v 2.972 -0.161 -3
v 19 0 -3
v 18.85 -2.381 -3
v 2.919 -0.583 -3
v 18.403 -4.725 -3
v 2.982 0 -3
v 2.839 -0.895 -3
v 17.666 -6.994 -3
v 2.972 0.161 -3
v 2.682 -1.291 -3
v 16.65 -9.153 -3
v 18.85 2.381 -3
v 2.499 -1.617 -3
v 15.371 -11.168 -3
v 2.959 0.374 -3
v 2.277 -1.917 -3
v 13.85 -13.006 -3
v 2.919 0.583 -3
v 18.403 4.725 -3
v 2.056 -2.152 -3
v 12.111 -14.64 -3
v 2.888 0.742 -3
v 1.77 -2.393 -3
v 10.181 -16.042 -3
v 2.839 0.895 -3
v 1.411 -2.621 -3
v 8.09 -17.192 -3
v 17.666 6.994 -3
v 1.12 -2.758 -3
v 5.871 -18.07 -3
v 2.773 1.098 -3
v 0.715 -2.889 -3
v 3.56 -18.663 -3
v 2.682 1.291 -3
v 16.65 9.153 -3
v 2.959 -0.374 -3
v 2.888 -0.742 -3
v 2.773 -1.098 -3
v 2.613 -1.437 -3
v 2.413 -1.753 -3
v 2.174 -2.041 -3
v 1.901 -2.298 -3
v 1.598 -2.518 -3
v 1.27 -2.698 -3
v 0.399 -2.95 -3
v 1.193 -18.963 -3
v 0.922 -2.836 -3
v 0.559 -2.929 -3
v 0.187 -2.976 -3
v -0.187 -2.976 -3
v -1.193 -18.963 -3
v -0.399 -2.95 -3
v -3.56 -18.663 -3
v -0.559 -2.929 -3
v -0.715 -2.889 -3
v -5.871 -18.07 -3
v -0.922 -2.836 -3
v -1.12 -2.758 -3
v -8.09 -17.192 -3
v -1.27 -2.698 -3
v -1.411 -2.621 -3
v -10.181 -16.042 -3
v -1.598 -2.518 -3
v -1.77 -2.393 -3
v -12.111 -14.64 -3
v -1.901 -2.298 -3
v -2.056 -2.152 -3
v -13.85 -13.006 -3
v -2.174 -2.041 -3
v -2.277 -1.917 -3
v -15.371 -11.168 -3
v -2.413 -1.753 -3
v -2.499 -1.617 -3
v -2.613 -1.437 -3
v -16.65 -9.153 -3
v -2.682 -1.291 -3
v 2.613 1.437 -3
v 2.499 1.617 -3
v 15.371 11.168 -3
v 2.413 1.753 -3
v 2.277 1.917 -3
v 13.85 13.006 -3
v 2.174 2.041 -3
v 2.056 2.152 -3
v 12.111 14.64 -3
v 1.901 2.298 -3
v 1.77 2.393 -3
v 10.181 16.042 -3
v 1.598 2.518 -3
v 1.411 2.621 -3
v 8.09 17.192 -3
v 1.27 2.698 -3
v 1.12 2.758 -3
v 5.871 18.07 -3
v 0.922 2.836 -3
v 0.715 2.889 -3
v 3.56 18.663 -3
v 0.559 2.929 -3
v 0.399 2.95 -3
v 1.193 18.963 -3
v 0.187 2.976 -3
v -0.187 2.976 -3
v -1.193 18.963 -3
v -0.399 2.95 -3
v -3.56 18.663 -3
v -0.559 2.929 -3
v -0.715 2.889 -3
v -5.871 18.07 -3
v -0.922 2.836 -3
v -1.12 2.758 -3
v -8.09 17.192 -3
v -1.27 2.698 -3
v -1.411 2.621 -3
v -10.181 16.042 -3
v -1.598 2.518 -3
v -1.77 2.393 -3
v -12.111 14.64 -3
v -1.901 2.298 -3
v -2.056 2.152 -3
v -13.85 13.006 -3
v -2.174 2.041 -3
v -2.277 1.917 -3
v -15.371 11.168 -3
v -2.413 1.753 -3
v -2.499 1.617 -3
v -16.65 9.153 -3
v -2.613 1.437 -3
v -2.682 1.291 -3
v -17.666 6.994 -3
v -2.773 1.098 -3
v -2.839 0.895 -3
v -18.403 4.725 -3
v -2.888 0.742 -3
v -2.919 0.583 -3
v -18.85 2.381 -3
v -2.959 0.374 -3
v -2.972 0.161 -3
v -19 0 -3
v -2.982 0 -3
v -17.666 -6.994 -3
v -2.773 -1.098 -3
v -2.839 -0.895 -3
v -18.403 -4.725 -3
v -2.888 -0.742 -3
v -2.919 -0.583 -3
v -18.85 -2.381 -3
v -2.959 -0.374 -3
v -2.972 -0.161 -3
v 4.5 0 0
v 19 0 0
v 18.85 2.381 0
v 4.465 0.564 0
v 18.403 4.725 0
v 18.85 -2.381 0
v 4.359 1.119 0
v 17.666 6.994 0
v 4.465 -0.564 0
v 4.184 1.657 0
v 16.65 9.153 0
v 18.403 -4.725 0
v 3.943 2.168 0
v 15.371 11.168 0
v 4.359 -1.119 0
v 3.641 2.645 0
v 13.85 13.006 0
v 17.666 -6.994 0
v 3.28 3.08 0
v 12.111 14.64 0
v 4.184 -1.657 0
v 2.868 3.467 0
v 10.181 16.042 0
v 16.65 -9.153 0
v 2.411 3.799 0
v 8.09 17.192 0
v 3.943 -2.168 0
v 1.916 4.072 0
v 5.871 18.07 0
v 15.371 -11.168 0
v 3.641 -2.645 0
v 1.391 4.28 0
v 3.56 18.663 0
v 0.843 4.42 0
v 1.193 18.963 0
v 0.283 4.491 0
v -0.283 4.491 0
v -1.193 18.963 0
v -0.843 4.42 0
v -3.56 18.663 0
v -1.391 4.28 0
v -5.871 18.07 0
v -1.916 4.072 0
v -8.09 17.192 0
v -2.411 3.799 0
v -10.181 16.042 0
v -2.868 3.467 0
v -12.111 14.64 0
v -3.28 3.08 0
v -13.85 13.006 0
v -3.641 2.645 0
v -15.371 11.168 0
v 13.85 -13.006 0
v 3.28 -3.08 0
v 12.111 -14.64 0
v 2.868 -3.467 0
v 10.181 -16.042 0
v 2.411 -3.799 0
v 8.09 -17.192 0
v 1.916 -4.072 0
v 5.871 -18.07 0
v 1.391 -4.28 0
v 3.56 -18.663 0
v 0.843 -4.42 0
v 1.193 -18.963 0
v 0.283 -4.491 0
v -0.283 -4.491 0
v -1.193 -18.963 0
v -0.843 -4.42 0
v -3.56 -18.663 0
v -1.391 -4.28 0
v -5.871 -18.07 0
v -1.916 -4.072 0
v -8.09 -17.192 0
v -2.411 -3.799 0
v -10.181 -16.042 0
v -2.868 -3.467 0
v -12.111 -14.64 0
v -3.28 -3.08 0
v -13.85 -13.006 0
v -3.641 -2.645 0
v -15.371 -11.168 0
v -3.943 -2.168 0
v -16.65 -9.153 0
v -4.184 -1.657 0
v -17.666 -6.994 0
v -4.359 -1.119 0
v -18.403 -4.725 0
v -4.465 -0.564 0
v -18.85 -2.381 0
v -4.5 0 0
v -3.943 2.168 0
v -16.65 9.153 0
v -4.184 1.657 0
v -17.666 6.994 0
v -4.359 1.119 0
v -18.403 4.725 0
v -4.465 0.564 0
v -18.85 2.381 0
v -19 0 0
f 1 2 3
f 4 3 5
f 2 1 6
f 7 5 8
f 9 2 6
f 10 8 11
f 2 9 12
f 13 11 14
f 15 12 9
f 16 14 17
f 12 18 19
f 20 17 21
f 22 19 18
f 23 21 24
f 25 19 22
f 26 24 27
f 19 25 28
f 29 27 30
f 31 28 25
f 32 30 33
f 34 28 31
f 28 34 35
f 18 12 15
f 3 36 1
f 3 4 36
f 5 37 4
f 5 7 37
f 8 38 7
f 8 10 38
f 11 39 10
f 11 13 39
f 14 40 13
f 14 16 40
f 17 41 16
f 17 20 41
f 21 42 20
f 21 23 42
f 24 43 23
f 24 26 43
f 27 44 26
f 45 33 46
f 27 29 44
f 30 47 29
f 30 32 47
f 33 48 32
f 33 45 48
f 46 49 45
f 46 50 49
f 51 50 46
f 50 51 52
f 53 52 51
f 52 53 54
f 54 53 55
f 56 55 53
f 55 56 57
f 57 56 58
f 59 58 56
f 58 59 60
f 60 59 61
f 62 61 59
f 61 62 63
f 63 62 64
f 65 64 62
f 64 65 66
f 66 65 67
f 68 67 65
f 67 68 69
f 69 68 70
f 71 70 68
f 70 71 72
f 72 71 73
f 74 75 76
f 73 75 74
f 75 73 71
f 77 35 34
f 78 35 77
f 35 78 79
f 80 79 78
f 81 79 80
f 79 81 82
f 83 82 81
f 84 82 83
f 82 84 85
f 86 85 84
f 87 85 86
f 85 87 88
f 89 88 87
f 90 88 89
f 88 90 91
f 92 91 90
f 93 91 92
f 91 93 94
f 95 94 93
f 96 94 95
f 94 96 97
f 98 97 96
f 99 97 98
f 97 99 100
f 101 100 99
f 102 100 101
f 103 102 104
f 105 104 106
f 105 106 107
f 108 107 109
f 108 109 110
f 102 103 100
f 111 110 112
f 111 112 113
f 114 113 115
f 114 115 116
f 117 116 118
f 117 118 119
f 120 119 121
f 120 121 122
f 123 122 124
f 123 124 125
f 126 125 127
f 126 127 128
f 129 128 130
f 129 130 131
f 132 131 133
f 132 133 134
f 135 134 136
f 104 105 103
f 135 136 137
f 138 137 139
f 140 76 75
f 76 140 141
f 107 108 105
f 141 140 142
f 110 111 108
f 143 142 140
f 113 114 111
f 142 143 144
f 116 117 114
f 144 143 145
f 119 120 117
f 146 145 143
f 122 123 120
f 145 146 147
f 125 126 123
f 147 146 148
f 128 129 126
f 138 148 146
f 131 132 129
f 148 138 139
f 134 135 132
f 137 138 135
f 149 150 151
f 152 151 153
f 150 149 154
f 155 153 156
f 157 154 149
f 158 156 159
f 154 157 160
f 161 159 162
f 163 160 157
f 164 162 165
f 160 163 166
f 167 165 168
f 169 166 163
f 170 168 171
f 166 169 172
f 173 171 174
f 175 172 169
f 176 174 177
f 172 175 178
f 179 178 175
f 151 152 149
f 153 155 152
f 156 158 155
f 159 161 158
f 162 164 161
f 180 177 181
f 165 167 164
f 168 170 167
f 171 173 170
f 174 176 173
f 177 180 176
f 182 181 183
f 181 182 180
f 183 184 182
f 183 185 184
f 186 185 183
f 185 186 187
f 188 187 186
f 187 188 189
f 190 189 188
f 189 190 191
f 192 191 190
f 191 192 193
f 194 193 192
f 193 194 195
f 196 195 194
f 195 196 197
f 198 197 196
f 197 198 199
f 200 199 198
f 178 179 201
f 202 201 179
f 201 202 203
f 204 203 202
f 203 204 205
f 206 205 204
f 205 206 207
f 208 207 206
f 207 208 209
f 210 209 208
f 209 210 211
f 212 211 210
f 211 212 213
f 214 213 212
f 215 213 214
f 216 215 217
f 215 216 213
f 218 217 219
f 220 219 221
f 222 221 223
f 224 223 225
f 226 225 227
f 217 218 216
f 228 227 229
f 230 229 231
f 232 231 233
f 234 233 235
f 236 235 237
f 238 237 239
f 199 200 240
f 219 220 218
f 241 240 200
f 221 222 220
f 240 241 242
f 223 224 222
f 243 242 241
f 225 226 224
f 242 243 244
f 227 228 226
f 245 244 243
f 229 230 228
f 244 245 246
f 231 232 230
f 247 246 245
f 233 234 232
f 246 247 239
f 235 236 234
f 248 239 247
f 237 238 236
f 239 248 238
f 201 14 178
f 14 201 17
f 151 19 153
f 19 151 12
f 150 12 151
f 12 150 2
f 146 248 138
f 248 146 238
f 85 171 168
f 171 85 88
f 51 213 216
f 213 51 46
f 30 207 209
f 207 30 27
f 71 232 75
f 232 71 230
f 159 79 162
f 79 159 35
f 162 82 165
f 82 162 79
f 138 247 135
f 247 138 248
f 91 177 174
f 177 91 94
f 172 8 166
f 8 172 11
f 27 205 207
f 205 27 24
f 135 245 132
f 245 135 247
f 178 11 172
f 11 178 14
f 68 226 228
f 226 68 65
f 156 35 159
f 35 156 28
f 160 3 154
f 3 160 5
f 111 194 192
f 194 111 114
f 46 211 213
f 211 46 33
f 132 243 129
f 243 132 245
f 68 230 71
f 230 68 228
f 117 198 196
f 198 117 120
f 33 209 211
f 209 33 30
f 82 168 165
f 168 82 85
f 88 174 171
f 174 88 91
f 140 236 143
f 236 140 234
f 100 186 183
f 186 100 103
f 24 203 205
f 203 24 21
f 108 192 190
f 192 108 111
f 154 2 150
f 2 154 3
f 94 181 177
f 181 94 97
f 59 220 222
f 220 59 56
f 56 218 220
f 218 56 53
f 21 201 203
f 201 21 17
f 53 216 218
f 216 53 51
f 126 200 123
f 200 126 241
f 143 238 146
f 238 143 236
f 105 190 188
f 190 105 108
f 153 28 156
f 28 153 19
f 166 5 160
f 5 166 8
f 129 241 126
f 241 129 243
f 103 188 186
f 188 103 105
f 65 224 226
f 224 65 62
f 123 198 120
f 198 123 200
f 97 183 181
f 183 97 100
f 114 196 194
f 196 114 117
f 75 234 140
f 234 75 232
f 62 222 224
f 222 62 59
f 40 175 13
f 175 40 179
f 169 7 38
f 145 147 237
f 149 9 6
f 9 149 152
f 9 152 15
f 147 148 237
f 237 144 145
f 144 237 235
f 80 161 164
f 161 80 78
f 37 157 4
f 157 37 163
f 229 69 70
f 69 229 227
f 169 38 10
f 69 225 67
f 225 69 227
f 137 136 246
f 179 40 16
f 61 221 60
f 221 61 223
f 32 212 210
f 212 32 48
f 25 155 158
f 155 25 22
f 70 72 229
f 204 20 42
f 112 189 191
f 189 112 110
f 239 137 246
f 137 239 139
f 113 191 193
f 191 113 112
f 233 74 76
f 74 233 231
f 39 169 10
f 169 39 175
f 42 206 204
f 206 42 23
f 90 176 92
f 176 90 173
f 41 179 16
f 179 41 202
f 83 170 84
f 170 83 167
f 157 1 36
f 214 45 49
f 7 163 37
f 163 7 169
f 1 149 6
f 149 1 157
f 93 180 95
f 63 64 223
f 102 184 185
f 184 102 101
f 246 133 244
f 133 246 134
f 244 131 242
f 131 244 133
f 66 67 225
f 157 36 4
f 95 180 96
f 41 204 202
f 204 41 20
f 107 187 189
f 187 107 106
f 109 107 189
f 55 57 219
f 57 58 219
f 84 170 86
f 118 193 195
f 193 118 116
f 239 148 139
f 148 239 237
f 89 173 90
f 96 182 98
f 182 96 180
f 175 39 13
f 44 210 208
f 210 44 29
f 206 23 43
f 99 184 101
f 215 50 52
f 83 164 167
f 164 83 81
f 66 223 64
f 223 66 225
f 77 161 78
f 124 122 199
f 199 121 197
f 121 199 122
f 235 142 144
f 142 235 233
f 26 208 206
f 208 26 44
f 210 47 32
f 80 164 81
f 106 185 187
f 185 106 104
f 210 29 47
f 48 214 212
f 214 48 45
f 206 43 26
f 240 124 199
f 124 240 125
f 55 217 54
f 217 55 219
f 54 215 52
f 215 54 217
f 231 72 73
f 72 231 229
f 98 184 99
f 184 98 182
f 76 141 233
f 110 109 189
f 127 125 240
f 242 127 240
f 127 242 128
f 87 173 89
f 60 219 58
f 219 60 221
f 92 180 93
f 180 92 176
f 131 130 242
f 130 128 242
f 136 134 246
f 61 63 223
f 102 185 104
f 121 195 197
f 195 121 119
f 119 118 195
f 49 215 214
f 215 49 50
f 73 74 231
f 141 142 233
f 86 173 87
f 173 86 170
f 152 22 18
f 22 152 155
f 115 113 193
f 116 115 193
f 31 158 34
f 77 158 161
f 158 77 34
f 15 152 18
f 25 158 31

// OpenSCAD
$fn = 50;


difference() {
	union() {
		translate(v = [0, 0, -3.0000000000]) {
			cylinder(h = 3, r = 10.0000000000);
		}
		translate(v = [0, 0, -3.0000000000]) {
			cylinder(h = 3, r = 19.0000000000);
		}
	}
	union() {
		translate(v = [0, 0, 0]) {
			rotate(a = [0, 0, 0]) {
				difference() {
					union() {
						#translate(v = [0, 0, -3.0000000000]) {
							cylinder(h = 3, r = 2.2500000000);
						}
						#translate(v = [0, 0, -4.2000000000]) {
							cylinder(h = 4.2000000000, r1 = 2.3750000000, r2 = 4.5000000000);
						}
						#translate(v = [0, 0, -3.0000000000]) {
							cylinder(h = 3, r = 2.3750000000);
						}
						#translate(v = [0, 0, -3.0000000000]) {
							cylinder(h = 3, r = 2.2500000000);
						}
					}
					union();
				}
			}
		}
	}
}
